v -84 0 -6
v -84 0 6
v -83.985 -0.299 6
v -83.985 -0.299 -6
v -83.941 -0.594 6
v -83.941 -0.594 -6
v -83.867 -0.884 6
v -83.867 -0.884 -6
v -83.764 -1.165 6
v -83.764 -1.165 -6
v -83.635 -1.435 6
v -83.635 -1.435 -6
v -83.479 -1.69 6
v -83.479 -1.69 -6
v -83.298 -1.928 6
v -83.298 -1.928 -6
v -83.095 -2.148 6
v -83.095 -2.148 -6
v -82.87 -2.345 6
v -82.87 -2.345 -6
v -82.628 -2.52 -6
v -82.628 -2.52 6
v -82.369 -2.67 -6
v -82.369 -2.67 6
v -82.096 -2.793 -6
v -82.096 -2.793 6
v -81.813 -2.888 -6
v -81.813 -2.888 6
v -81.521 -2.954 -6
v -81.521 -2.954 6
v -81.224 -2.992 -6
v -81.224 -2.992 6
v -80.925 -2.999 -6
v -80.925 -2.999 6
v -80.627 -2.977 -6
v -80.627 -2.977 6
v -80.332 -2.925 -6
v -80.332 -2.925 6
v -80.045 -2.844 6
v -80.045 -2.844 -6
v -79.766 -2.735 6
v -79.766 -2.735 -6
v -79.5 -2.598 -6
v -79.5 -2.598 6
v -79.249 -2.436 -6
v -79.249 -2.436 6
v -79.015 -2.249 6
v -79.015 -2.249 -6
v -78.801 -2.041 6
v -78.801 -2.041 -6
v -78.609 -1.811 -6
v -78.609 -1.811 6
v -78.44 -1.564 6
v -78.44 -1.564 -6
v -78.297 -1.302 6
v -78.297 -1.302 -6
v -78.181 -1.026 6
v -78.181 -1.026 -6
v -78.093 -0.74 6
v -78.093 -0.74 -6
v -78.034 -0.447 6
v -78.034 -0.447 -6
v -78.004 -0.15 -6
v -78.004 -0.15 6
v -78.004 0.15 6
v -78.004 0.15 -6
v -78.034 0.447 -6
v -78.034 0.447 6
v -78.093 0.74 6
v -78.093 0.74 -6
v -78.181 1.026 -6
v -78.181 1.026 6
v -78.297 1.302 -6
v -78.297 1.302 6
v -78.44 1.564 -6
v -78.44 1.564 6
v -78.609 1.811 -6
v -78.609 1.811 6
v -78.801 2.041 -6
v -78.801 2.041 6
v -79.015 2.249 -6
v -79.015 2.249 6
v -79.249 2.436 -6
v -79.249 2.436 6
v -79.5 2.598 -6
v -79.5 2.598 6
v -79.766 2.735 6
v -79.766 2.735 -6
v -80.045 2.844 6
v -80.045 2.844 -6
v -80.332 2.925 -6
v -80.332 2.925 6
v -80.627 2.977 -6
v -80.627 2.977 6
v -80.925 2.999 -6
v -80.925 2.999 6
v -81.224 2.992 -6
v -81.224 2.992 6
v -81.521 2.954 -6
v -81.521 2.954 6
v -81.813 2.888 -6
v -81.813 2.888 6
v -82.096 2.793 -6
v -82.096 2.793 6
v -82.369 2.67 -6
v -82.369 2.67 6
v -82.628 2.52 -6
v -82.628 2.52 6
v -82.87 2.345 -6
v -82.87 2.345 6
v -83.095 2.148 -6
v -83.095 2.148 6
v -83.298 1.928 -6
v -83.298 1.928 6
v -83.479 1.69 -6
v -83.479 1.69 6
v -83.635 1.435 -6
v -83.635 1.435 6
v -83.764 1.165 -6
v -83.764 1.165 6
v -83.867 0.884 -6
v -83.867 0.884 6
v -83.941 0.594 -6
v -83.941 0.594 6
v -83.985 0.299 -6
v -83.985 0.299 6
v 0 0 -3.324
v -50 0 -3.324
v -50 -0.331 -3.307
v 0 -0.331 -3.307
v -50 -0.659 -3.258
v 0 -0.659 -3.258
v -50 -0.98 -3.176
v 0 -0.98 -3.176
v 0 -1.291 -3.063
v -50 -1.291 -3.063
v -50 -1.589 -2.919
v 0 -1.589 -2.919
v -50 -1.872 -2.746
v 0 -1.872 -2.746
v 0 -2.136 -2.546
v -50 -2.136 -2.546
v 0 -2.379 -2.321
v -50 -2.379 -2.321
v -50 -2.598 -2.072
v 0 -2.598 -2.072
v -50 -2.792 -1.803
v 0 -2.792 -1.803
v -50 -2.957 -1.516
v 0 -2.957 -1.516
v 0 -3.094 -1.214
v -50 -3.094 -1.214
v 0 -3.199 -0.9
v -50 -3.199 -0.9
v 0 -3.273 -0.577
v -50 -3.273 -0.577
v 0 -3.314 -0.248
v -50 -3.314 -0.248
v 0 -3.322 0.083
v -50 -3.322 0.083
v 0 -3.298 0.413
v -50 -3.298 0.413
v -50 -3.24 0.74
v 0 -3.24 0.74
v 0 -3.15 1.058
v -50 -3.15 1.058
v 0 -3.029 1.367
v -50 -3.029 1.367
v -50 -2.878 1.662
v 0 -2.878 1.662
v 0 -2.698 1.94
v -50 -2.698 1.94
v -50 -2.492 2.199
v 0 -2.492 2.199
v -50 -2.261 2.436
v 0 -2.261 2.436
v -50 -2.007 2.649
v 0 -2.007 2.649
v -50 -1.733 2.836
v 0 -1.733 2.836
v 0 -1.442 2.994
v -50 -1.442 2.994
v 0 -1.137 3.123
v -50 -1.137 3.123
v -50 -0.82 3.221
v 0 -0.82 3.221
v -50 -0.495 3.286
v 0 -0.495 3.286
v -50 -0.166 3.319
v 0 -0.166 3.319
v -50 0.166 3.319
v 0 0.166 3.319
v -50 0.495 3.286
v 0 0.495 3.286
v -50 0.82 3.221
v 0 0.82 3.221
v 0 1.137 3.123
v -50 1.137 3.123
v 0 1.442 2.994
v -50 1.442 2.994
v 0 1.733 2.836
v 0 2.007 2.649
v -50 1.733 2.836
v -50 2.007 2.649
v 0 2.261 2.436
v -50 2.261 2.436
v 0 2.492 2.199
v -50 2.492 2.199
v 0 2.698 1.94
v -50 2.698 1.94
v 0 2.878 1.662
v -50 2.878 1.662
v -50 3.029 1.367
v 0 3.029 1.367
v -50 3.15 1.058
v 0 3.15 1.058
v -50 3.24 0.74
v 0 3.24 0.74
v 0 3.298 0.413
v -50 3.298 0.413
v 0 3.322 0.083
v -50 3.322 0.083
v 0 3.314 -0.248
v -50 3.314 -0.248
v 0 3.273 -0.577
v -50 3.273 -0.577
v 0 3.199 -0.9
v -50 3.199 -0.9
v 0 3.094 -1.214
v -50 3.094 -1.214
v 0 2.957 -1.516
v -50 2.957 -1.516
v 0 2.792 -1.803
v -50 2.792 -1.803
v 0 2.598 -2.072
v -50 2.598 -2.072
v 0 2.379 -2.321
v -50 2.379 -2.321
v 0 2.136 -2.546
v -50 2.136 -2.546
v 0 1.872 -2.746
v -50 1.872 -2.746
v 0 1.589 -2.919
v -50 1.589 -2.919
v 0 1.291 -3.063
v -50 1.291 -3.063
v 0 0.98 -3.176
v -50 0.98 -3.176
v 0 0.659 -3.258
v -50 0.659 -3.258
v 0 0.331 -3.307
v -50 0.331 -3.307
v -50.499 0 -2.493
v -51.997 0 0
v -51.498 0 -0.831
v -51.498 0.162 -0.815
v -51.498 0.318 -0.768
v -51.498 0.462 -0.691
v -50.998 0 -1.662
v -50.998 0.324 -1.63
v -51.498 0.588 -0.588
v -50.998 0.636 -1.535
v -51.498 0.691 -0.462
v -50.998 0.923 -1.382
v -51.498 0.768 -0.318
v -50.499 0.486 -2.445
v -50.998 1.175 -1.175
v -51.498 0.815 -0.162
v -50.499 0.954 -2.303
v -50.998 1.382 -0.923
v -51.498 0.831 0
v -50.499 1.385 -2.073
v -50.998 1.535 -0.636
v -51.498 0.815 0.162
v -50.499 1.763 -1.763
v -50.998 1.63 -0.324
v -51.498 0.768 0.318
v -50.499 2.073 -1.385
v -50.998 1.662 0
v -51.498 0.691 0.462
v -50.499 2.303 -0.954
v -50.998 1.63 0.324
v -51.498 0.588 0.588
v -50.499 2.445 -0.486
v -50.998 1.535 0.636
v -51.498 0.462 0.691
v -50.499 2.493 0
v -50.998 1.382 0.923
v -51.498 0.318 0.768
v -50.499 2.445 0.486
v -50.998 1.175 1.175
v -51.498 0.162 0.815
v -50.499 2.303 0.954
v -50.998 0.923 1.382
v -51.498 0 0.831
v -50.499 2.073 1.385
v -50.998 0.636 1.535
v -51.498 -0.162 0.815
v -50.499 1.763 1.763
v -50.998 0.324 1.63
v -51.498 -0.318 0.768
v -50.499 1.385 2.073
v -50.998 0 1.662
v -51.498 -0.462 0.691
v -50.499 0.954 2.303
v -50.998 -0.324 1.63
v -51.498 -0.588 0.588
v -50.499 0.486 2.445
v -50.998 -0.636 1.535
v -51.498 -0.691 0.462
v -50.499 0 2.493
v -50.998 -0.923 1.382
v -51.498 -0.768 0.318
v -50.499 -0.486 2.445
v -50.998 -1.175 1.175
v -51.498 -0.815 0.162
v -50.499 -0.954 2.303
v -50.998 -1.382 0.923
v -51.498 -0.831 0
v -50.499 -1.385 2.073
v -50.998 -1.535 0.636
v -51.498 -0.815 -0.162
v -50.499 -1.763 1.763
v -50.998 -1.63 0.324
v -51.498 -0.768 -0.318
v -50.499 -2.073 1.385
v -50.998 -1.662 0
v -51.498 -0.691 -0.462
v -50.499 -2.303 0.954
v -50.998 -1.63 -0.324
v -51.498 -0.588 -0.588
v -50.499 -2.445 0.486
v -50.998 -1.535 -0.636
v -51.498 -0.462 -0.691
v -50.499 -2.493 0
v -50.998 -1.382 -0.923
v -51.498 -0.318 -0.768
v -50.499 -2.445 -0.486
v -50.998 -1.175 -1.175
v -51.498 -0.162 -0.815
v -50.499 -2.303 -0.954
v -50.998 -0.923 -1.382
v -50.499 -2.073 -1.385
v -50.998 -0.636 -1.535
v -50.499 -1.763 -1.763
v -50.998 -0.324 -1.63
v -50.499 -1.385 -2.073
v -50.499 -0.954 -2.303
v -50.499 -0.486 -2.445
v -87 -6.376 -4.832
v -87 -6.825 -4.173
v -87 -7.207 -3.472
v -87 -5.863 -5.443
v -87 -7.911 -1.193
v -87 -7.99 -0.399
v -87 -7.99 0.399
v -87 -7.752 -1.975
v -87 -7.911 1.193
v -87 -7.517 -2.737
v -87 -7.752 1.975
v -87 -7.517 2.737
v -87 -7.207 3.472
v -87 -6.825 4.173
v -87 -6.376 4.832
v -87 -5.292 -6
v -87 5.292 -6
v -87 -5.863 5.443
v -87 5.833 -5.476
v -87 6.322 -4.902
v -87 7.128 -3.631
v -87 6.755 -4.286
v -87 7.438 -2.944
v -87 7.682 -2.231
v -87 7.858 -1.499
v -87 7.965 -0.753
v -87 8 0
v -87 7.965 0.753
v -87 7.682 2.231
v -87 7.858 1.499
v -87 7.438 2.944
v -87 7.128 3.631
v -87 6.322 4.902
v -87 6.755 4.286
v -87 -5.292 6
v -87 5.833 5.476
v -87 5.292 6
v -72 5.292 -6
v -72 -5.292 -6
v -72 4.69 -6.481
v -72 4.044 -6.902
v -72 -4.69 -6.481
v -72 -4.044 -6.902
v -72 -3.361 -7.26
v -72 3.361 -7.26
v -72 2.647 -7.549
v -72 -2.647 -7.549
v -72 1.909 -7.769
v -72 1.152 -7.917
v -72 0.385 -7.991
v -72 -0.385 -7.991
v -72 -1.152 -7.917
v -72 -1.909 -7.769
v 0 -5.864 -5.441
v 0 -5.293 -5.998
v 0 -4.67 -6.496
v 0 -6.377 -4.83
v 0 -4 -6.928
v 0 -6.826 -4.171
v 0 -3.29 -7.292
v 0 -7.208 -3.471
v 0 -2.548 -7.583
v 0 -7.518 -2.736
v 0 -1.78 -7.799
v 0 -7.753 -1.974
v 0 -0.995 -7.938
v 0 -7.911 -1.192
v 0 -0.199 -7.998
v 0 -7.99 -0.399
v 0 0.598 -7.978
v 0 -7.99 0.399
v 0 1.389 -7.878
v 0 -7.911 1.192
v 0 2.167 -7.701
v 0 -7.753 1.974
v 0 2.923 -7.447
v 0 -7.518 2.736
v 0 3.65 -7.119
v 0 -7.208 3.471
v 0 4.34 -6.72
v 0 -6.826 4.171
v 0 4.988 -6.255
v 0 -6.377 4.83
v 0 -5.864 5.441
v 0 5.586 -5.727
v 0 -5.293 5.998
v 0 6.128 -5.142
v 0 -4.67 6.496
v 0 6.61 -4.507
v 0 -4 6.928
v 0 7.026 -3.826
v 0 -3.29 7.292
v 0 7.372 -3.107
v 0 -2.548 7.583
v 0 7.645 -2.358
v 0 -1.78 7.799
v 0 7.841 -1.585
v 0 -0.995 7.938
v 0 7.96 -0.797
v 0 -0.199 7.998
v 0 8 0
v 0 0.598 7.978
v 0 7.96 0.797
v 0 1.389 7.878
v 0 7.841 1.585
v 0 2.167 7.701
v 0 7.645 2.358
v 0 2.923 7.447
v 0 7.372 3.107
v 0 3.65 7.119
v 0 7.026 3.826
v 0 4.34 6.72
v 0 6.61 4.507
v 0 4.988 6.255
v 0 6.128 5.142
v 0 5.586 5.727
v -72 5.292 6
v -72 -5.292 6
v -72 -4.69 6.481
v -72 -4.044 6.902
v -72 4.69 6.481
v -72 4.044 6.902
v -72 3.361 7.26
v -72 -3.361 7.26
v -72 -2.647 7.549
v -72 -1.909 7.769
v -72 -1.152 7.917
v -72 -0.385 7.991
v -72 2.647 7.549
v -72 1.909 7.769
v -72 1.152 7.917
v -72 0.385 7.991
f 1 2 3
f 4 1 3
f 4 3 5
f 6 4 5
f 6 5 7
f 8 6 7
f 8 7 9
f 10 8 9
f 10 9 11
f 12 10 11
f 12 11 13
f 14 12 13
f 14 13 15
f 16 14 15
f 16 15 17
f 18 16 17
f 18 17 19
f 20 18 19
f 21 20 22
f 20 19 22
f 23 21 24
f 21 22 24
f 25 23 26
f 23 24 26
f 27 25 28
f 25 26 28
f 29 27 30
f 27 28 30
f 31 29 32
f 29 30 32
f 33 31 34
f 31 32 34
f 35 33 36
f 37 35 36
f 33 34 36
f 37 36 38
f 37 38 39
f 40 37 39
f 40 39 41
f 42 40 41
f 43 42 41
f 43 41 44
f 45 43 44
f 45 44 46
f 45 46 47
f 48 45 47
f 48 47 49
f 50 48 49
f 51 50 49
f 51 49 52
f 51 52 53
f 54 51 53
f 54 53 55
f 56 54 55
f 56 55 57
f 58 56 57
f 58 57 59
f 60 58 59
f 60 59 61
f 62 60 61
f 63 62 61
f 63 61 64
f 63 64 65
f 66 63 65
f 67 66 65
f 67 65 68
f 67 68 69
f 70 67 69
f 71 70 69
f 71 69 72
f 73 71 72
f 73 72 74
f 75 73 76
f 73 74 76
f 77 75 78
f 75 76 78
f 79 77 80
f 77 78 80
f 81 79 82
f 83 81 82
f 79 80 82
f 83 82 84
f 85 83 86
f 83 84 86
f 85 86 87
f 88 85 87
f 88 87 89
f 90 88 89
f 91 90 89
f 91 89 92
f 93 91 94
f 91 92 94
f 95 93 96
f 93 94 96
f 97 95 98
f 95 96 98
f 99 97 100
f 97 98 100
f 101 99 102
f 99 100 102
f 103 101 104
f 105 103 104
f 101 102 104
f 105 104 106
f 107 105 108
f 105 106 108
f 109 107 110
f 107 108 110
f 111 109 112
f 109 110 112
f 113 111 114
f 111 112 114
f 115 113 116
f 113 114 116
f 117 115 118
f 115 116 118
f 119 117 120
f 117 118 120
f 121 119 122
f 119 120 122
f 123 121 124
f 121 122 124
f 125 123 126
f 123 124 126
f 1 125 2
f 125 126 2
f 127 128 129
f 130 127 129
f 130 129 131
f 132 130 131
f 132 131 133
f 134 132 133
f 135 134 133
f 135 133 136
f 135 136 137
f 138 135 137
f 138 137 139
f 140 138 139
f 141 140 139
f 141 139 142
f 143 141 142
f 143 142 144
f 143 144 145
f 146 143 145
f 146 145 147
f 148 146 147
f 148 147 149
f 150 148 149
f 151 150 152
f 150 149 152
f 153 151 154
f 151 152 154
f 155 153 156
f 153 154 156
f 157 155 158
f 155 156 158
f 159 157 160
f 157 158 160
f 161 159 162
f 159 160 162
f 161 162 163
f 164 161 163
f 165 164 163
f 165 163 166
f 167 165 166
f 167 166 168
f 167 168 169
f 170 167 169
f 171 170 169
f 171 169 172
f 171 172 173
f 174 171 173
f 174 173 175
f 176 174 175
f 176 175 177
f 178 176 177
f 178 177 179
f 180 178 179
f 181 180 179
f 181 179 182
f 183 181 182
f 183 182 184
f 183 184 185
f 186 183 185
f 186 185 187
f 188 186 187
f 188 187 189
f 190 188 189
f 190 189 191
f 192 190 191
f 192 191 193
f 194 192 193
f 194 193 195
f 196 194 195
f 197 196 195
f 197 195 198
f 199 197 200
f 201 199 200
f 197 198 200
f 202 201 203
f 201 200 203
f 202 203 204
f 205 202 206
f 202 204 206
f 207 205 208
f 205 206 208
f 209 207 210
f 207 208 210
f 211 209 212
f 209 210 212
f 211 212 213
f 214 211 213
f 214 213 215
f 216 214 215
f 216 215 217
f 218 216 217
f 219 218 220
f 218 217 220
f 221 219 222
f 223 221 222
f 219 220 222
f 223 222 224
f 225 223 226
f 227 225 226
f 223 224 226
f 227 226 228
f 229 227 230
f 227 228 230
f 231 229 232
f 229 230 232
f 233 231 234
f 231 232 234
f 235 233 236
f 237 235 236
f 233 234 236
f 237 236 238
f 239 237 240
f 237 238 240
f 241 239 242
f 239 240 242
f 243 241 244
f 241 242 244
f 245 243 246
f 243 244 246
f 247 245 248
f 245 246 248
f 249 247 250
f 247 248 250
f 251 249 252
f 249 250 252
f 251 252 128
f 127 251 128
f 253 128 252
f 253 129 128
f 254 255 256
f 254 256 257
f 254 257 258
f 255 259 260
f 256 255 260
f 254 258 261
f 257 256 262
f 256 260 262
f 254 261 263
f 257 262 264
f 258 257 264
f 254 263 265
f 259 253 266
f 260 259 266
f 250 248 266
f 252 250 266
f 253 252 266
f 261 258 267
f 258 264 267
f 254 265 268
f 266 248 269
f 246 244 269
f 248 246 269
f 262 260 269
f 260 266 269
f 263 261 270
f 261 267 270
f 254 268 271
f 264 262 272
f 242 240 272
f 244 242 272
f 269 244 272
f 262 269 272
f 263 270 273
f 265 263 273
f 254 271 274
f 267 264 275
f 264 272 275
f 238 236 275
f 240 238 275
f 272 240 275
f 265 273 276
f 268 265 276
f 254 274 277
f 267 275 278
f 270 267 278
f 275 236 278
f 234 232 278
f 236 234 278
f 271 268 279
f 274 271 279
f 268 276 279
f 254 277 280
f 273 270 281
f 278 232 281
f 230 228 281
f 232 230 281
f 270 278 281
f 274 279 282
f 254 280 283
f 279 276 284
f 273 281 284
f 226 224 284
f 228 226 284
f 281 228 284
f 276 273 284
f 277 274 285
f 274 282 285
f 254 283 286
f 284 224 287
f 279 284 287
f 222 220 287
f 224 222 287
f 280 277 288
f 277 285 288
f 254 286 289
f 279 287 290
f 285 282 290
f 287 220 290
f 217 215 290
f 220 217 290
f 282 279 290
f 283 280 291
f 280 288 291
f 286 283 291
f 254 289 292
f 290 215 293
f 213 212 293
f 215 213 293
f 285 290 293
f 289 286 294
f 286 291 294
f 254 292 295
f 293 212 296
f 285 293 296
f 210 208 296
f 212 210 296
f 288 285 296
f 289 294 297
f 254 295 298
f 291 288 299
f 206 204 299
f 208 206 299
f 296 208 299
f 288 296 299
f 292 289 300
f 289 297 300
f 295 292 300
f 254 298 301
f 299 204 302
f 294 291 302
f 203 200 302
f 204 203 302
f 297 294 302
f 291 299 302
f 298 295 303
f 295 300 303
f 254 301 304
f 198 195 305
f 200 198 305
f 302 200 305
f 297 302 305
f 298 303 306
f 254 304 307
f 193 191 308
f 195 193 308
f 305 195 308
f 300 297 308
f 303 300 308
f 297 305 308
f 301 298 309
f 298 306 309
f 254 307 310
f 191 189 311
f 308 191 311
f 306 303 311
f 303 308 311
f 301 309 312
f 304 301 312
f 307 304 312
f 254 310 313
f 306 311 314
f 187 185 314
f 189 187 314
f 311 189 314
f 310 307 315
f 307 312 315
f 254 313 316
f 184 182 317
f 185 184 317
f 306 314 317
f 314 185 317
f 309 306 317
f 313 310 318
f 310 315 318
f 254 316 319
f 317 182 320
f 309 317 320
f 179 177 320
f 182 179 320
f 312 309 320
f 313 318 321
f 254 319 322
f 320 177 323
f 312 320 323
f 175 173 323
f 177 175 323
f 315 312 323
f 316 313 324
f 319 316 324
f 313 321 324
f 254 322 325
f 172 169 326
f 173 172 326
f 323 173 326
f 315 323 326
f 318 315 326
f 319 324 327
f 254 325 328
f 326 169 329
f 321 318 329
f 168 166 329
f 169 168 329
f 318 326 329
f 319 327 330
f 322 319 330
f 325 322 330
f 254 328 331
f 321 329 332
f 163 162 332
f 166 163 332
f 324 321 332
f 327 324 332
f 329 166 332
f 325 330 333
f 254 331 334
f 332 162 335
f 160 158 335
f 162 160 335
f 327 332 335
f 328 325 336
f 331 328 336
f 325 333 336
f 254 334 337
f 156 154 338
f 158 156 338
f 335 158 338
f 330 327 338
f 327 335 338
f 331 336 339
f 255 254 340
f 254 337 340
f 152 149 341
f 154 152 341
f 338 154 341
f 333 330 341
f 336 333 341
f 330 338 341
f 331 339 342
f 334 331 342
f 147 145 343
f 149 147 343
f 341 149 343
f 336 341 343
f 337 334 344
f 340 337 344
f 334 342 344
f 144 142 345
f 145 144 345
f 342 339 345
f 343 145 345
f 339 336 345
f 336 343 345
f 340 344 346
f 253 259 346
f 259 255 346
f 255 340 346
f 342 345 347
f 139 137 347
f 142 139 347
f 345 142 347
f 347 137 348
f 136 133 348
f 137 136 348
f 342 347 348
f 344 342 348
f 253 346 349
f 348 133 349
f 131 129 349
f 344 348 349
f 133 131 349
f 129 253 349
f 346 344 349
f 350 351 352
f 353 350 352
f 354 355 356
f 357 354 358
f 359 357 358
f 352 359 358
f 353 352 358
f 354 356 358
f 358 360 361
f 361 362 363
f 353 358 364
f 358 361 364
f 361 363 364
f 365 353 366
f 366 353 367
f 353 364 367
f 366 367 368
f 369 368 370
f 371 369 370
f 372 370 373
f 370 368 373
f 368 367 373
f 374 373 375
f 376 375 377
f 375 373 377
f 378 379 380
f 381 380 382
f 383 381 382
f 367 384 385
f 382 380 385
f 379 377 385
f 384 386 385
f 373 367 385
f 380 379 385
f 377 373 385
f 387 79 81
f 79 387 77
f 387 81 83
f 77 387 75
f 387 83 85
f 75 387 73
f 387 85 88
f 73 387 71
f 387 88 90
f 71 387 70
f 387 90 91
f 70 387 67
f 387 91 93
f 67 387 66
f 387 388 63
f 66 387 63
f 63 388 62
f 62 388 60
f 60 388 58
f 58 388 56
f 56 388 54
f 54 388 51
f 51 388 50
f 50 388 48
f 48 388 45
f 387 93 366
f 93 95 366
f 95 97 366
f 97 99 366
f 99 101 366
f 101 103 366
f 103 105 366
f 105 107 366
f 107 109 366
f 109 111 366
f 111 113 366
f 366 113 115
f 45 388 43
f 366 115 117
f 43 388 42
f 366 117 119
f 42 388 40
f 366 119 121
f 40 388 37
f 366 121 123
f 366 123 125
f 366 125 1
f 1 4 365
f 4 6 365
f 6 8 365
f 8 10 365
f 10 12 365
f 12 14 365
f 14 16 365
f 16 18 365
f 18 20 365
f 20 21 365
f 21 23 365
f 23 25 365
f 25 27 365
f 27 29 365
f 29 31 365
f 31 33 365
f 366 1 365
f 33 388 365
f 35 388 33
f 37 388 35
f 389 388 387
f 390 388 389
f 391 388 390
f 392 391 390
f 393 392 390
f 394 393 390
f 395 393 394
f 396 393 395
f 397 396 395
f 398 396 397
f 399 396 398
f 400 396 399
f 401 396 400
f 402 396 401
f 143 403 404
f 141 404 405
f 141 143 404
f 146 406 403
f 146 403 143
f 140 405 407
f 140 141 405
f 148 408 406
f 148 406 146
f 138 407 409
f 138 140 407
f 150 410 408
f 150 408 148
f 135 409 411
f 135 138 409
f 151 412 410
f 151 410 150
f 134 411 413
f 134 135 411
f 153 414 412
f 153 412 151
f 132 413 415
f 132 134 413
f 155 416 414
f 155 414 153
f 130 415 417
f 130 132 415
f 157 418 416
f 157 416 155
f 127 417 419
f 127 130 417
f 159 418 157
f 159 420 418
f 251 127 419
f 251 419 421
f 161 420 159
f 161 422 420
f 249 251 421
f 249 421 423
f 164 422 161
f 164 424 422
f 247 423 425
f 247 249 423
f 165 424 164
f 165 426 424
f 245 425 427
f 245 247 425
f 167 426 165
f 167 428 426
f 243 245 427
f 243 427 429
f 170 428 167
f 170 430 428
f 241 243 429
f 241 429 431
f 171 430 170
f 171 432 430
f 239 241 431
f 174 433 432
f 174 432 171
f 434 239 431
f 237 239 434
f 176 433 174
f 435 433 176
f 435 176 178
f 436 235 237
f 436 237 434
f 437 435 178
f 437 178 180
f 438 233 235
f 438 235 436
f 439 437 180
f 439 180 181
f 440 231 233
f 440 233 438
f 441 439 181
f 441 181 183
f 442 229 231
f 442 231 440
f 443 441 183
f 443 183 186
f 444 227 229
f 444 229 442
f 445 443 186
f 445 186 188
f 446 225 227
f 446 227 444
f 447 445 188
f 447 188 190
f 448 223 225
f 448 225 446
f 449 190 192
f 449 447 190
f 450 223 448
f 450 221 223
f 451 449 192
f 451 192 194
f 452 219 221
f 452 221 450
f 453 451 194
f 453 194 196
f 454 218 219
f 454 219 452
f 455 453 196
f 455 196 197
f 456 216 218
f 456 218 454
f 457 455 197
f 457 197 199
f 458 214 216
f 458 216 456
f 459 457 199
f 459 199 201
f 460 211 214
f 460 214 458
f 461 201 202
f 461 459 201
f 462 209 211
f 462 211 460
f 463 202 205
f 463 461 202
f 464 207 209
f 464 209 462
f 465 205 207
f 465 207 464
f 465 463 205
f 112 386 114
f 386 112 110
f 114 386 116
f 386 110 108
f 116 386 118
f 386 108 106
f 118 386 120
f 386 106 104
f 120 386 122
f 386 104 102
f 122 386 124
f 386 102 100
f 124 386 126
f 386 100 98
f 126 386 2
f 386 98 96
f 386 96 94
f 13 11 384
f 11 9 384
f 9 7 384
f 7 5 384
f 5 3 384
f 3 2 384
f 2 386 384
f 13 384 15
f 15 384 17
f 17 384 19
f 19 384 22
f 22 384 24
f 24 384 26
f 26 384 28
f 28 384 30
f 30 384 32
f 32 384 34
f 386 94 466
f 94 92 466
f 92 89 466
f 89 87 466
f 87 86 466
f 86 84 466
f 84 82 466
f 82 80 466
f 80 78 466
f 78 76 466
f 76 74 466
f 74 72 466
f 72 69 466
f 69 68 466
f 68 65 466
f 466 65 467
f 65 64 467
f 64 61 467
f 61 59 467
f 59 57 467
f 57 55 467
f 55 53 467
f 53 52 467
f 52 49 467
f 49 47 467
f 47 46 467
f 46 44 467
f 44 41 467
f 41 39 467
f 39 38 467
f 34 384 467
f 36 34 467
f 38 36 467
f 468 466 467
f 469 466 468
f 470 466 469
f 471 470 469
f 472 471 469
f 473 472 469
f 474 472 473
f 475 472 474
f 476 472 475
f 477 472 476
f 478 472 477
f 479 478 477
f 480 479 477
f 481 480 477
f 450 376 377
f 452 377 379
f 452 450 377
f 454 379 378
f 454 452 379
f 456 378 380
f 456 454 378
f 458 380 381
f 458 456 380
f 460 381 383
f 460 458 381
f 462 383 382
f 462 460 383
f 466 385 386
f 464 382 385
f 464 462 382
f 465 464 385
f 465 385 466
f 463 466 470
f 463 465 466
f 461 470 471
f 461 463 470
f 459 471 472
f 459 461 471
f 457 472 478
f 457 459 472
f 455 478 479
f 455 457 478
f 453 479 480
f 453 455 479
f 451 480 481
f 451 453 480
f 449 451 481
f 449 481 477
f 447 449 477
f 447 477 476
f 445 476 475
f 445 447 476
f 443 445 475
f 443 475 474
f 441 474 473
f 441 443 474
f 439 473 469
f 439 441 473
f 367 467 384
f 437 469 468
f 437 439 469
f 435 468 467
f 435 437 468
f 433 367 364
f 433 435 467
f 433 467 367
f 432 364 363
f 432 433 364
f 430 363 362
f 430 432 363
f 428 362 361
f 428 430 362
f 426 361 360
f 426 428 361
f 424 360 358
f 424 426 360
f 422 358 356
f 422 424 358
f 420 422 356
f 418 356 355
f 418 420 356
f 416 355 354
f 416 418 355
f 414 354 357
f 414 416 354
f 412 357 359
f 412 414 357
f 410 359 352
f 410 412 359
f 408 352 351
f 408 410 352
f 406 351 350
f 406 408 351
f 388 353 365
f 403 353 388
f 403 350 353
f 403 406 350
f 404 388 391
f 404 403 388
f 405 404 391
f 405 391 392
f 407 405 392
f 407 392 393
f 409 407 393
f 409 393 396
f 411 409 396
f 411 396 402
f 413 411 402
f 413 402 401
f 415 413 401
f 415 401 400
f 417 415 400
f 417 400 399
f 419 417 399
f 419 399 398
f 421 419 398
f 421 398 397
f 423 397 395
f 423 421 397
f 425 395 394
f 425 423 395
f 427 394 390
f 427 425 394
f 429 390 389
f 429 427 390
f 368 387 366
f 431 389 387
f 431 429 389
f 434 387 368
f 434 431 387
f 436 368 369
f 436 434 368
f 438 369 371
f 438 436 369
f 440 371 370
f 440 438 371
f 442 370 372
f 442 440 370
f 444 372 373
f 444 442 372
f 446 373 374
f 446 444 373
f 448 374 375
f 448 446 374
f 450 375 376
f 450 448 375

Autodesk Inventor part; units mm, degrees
ref_plane "YZ Plane" through (0, 0, 0) normal (1, 0, 0) x (0, 1, 0)
ref_plane "XZ Plane" through (0, 0, 0) normal (0, 1, 0) x (-1, 0, 0)
sketch "Sketch1" plane through (0, 0, 0) normal (1, 0, 0) x (0, 1, 0)
  circle A0 centre (0, 0) radius 8
  dimension "d0" = 16
extrude "Extrusion1" add sketch "Sketch1" against normal blind 87
ref_plane "Work Plane1" through (0, 0, 0) normal (0, 0, 1) x (-1, 0, 0)
sketch "Sketch2" plane through (0, 0, 0) normal (0, 0, 1) x (1, 0, 0)
  point P0 (0, 0)
ref_plane "Work Plane2" through (0, 0, -6) normal (0, 0, 1) x (-1, 0, 0)
sketch "Sketch3" plane through (0, 0, -6) normal (0, 0, 1) x (-1, 0, 0)
  line L0 (72, -14.6866) -> (87, -14.6866)
  line L1 (87, -14.6866) -> (87, 13.5616)
  line L2 (87, 13.5616) -> (72, 13.5616)
  line L3 (72, 13.5616) -> (72, -14.6866)
  line L4 (87, -8) -> (87, 8) projected
  point P0 (0, 0)
  dimension "d5" = 15
  dimension "d6" = 0
extrude "Extrusion2" cut sketch "Sketch3" against normal blind 87
mirror "Mirror1" about plane through (0, 0, 0) normal (0, 0, 1) of "Extrusion2"
sketch "Sketch4" plane through (0, 0, 0) normal (0, 0, 1) x (-1, 0, 0)
  circle A0 centre (81, 0) radius 3
  line L0 (87, -5.2915) -> (87, 5.2915) projected
  point P0 (0, 0)
  dimension "d9" = 6
  dimension "d10" = 6
extrude "Extrusion3" cut sketch "Sketch4" along normal mid plane 20
hole "Hole1" at (0, 0, 0) direction (-1, 0, 0) diameter 6.647 depth 50 tip angle 118 thread size "M8x1.25" class "6H" standard "ISO Metric profile"
properties material "Steel"
